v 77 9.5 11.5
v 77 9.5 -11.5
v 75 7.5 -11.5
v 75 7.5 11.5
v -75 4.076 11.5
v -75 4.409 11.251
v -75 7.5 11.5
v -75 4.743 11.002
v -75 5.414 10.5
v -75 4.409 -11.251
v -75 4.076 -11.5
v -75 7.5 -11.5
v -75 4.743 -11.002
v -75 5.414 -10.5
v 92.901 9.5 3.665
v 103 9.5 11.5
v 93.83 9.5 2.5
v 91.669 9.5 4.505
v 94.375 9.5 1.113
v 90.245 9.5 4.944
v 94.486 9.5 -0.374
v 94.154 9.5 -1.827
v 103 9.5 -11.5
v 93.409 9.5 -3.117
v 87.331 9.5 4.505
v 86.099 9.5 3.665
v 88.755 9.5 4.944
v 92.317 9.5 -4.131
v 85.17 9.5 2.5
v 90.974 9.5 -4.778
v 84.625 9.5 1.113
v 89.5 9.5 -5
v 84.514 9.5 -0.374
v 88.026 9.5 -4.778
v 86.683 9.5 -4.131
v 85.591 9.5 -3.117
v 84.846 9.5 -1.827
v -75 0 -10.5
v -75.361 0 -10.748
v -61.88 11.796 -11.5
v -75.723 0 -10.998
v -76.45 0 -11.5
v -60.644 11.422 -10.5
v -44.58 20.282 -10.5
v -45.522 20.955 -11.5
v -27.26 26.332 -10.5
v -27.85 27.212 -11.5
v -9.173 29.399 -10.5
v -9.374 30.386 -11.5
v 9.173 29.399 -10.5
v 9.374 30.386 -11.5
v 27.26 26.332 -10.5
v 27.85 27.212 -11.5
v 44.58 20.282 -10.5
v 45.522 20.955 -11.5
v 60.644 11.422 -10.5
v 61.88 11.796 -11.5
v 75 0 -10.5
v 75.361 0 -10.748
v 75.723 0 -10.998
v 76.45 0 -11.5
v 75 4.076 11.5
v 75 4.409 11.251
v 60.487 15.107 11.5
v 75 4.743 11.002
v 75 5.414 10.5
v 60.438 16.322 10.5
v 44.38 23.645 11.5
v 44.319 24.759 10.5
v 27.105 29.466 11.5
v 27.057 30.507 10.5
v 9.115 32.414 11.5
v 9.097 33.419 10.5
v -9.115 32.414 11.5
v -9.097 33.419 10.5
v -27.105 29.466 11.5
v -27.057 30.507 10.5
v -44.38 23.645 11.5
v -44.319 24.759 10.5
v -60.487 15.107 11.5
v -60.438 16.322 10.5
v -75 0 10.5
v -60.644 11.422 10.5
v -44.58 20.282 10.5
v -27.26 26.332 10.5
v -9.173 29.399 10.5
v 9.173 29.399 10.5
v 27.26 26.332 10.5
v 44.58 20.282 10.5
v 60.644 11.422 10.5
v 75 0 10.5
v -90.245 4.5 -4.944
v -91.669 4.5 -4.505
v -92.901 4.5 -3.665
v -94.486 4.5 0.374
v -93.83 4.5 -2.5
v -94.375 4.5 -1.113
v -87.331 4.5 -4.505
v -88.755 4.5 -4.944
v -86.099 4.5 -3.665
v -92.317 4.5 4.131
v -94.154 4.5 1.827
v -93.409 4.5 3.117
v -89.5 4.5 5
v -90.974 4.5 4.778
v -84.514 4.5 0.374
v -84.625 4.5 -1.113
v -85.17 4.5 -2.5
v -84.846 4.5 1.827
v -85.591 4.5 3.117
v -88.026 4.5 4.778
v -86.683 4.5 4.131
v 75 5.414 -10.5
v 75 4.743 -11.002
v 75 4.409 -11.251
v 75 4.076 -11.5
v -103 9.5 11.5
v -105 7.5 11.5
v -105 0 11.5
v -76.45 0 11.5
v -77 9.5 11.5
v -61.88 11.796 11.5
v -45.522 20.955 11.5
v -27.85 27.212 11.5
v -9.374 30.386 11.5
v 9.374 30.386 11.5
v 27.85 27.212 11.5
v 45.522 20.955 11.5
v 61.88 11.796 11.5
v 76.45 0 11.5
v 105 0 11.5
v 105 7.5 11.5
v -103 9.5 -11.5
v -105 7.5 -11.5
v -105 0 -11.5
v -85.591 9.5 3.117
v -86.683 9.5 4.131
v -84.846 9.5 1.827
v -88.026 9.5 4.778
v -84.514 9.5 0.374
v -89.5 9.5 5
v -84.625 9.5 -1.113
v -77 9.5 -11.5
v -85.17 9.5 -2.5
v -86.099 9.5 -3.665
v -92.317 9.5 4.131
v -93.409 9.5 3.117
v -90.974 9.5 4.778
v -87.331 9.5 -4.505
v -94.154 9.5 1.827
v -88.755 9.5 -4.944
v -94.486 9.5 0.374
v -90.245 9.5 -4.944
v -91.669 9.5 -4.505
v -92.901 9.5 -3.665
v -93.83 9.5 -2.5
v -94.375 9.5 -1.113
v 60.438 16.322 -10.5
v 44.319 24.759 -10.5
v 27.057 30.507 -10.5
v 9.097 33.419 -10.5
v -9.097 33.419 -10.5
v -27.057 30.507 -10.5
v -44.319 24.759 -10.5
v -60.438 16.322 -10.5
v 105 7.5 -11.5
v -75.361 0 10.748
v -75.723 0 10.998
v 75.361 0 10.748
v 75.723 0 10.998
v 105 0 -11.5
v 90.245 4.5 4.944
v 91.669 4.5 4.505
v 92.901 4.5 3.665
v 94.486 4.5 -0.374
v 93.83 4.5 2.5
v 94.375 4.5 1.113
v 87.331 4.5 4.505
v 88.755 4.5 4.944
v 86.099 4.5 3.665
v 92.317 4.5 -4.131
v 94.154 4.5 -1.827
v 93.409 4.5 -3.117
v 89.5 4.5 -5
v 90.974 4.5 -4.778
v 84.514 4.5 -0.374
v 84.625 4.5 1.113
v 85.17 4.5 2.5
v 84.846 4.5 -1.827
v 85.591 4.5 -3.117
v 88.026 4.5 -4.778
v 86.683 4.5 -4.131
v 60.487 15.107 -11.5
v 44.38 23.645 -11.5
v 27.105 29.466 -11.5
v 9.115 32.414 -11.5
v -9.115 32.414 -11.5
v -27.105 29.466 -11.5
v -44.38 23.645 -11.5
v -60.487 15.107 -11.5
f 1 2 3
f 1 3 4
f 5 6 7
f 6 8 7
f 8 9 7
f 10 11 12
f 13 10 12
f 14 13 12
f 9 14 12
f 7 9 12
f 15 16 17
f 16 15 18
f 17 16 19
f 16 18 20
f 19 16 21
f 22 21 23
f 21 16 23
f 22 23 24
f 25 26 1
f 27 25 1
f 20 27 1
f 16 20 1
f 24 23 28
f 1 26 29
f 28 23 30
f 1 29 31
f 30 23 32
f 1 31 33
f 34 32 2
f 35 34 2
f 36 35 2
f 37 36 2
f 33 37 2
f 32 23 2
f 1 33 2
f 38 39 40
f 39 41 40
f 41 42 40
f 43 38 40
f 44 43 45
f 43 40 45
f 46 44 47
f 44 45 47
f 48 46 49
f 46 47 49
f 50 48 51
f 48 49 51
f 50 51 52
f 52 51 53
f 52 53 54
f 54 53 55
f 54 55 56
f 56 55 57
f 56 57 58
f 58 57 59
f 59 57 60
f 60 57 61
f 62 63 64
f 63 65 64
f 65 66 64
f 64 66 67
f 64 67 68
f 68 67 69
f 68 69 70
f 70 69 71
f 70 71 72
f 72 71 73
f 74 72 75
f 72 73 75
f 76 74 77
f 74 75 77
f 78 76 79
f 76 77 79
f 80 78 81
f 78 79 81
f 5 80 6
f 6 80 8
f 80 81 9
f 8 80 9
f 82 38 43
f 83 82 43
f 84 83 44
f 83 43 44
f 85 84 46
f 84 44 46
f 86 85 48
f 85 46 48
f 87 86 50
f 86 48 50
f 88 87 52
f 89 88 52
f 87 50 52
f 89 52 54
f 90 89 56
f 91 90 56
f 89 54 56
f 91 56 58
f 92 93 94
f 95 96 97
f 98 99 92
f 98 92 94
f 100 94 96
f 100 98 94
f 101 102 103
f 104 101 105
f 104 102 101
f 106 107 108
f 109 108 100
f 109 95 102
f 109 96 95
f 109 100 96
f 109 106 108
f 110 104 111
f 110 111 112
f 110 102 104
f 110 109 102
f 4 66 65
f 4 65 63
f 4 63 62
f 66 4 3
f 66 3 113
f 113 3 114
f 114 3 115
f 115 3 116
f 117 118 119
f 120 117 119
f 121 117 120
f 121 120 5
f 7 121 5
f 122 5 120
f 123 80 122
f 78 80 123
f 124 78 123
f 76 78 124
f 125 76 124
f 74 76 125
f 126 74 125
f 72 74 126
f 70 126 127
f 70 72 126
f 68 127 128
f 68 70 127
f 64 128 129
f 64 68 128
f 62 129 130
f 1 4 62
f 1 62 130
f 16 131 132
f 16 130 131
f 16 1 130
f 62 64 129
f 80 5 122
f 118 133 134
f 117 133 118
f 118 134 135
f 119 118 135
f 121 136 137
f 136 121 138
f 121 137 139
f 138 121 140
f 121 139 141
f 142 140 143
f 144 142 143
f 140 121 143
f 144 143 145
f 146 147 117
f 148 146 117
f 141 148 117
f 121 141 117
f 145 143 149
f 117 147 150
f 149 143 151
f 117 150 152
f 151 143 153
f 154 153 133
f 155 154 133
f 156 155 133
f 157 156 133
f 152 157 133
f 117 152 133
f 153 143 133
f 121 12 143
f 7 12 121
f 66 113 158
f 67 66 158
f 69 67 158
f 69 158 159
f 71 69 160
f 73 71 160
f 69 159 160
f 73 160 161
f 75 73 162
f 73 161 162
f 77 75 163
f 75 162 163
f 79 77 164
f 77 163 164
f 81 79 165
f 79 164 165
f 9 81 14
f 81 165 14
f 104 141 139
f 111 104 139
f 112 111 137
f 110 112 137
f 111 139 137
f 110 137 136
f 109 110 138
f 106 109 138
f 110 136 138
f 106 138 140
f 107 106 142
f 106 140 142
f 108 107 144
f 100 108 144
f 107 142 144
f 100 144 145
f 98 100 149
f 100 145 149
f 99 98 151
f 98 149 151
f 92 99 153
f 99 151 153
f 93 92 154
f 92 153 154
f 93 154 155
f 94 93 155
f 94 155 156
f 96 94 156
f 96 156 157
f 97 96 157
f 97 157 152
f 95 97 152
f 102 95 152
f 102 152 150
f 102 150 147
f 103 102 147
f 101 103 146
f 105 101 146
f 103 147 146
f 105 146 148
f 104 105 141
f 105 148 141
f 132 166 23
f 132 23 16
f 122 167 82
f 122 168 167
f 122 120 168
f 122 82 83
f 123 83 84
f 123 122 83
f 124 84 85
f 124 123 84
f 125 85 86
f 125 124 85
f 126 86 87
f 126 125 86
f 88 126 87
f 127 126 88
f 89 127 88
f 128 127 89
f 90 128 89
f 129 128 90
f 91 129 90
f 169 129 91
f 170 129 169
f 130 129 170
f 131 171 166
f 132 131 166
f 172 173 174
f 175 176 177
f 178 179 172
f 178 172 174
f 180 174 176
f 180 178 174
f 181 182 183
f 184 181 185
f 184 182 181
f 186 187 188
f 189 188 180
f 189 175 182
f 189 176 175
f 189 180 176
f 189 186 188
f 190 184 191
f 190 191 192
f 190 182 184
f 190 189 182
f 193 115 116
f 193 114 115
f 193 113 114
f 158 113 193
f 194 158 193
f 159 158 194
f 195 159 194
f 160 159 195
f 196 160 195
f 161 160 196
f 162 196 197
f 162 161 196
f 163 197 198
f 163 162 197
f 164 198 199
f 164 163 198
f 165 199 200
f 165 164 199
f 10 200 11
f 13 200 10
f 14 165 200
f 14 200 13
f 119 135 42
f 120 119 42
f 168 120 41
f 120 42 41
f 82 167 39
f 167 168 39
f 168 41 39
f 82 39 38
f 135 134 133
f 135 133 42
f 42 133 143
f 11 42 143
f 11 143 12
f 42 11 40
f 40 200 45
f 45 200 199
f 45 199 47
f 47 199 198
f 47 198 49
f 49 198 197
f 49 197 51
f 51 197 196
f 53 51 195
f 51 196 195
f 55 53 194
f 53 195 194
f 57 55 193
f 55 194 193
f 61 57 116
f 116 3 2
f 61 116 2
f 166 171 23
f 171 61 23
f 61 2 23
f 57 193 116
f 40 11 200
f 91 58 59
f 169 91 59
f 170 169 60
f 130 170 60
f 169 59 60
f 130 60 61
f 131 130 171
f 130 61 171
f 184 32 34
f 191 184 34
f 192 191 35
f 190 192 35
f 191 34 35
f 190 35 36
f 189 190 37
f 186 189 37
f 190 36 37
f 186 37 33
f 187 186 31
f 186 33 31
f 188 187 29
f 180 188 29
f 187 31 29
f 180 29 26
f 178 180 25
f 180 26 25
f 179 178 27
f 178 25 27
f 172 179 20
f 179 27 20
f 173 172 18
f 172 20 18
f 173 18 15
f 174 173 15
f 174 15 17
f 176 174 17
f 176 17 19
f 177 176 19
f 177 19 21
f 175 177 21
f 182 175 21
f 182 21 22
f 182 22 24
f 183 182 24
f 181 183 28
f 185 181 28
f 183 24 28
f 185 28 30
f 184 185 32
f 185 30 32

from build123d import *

# Parameters (mm, degrees)
EXTRUDE_1_DEPTH      = 11.5
EXTRUDE_1_DEPTH_BACK = 11.5
SKETCH_2_R           = 5
CUT_EXTRUDE_1_DEPTH  = 5
CHAMFER_1_SIZE       = 1
CHAMFER_2_SIZE       = 2


with BuildPart() as part:
    # 草图1 → 凸台-拉伸1 (new, two sides: drawn at the far end of the back side and taken through both)
    with BuildSketch(Plane.XY.offset(-EXTRUDE_1_DEPTH_BACK)):
        with BuildLine():
            Line((-105, 0), (-75, 0))
            ThreePointArc((-75, 0), (0, 29.784938454), (75, 0))
            Line((75, 0), (105, 0))
            Line((105, 0), (105, 9.5))
            Line((105, 9.5), (75, 9.5))
            Line((75, 9.5), (75, 5.414263011))
            ThreePointArc((75, 5.414263011), (0, 33.784938454), (-75, 5.414263011))
            Line((-75, 5.414263011), (-75, 9.5))
            Line((-75, 9.5), (-105, 9.5))
            Line((-105, 9.5), (-105, 0))
        make_face()
    extrude(amount=EXTRUDE_1_DEPTH + EXTRUDE_1_DEPTH_BACK)

    # 草图2 → 切除-拉伸1 (cut)
    with BuildSketch(Plane(origin=(0, 9.5, 0), x_dir=(1, 0, 0), z_dir=(0, 1, 0))):
        with Locations((-89.5, 0)):
            Circle(SKETCH_2_R)
        with Locations((89.5, 0)):
            Circle(SKETCH_2_R)
    extrude(amount=-CUT_EXTRUDE_1_DEPTH, mode=Mode.SUBTRACT)

    # 倒角1
    chamfer_1_edges = [part.edges().sort_by_distance(p)[0] for p in [
        (0, 29.784938454, 11.5),
        (0, 29.784938454, -11.5),
        (0, 33.784938454, -11.5),
        (0, 33.784938454, 11.5),
    ]]
    chamfer(chamfer_1_edges, length=CHAMFER_1_SIZE)

    # 倒角2
    chamfer_2_edges = [part.edges().sort_by_distance(p)[0] for p in [
        (-105, 9.5, 0),
        (-75, 9.5, 0),
        (75, 9.5, 0),
        (105, 9.5, 0),
    ]]
    chamfer(chamfer_2_edges, length=CHAMFER_2_SIZE)


solid = part.part
